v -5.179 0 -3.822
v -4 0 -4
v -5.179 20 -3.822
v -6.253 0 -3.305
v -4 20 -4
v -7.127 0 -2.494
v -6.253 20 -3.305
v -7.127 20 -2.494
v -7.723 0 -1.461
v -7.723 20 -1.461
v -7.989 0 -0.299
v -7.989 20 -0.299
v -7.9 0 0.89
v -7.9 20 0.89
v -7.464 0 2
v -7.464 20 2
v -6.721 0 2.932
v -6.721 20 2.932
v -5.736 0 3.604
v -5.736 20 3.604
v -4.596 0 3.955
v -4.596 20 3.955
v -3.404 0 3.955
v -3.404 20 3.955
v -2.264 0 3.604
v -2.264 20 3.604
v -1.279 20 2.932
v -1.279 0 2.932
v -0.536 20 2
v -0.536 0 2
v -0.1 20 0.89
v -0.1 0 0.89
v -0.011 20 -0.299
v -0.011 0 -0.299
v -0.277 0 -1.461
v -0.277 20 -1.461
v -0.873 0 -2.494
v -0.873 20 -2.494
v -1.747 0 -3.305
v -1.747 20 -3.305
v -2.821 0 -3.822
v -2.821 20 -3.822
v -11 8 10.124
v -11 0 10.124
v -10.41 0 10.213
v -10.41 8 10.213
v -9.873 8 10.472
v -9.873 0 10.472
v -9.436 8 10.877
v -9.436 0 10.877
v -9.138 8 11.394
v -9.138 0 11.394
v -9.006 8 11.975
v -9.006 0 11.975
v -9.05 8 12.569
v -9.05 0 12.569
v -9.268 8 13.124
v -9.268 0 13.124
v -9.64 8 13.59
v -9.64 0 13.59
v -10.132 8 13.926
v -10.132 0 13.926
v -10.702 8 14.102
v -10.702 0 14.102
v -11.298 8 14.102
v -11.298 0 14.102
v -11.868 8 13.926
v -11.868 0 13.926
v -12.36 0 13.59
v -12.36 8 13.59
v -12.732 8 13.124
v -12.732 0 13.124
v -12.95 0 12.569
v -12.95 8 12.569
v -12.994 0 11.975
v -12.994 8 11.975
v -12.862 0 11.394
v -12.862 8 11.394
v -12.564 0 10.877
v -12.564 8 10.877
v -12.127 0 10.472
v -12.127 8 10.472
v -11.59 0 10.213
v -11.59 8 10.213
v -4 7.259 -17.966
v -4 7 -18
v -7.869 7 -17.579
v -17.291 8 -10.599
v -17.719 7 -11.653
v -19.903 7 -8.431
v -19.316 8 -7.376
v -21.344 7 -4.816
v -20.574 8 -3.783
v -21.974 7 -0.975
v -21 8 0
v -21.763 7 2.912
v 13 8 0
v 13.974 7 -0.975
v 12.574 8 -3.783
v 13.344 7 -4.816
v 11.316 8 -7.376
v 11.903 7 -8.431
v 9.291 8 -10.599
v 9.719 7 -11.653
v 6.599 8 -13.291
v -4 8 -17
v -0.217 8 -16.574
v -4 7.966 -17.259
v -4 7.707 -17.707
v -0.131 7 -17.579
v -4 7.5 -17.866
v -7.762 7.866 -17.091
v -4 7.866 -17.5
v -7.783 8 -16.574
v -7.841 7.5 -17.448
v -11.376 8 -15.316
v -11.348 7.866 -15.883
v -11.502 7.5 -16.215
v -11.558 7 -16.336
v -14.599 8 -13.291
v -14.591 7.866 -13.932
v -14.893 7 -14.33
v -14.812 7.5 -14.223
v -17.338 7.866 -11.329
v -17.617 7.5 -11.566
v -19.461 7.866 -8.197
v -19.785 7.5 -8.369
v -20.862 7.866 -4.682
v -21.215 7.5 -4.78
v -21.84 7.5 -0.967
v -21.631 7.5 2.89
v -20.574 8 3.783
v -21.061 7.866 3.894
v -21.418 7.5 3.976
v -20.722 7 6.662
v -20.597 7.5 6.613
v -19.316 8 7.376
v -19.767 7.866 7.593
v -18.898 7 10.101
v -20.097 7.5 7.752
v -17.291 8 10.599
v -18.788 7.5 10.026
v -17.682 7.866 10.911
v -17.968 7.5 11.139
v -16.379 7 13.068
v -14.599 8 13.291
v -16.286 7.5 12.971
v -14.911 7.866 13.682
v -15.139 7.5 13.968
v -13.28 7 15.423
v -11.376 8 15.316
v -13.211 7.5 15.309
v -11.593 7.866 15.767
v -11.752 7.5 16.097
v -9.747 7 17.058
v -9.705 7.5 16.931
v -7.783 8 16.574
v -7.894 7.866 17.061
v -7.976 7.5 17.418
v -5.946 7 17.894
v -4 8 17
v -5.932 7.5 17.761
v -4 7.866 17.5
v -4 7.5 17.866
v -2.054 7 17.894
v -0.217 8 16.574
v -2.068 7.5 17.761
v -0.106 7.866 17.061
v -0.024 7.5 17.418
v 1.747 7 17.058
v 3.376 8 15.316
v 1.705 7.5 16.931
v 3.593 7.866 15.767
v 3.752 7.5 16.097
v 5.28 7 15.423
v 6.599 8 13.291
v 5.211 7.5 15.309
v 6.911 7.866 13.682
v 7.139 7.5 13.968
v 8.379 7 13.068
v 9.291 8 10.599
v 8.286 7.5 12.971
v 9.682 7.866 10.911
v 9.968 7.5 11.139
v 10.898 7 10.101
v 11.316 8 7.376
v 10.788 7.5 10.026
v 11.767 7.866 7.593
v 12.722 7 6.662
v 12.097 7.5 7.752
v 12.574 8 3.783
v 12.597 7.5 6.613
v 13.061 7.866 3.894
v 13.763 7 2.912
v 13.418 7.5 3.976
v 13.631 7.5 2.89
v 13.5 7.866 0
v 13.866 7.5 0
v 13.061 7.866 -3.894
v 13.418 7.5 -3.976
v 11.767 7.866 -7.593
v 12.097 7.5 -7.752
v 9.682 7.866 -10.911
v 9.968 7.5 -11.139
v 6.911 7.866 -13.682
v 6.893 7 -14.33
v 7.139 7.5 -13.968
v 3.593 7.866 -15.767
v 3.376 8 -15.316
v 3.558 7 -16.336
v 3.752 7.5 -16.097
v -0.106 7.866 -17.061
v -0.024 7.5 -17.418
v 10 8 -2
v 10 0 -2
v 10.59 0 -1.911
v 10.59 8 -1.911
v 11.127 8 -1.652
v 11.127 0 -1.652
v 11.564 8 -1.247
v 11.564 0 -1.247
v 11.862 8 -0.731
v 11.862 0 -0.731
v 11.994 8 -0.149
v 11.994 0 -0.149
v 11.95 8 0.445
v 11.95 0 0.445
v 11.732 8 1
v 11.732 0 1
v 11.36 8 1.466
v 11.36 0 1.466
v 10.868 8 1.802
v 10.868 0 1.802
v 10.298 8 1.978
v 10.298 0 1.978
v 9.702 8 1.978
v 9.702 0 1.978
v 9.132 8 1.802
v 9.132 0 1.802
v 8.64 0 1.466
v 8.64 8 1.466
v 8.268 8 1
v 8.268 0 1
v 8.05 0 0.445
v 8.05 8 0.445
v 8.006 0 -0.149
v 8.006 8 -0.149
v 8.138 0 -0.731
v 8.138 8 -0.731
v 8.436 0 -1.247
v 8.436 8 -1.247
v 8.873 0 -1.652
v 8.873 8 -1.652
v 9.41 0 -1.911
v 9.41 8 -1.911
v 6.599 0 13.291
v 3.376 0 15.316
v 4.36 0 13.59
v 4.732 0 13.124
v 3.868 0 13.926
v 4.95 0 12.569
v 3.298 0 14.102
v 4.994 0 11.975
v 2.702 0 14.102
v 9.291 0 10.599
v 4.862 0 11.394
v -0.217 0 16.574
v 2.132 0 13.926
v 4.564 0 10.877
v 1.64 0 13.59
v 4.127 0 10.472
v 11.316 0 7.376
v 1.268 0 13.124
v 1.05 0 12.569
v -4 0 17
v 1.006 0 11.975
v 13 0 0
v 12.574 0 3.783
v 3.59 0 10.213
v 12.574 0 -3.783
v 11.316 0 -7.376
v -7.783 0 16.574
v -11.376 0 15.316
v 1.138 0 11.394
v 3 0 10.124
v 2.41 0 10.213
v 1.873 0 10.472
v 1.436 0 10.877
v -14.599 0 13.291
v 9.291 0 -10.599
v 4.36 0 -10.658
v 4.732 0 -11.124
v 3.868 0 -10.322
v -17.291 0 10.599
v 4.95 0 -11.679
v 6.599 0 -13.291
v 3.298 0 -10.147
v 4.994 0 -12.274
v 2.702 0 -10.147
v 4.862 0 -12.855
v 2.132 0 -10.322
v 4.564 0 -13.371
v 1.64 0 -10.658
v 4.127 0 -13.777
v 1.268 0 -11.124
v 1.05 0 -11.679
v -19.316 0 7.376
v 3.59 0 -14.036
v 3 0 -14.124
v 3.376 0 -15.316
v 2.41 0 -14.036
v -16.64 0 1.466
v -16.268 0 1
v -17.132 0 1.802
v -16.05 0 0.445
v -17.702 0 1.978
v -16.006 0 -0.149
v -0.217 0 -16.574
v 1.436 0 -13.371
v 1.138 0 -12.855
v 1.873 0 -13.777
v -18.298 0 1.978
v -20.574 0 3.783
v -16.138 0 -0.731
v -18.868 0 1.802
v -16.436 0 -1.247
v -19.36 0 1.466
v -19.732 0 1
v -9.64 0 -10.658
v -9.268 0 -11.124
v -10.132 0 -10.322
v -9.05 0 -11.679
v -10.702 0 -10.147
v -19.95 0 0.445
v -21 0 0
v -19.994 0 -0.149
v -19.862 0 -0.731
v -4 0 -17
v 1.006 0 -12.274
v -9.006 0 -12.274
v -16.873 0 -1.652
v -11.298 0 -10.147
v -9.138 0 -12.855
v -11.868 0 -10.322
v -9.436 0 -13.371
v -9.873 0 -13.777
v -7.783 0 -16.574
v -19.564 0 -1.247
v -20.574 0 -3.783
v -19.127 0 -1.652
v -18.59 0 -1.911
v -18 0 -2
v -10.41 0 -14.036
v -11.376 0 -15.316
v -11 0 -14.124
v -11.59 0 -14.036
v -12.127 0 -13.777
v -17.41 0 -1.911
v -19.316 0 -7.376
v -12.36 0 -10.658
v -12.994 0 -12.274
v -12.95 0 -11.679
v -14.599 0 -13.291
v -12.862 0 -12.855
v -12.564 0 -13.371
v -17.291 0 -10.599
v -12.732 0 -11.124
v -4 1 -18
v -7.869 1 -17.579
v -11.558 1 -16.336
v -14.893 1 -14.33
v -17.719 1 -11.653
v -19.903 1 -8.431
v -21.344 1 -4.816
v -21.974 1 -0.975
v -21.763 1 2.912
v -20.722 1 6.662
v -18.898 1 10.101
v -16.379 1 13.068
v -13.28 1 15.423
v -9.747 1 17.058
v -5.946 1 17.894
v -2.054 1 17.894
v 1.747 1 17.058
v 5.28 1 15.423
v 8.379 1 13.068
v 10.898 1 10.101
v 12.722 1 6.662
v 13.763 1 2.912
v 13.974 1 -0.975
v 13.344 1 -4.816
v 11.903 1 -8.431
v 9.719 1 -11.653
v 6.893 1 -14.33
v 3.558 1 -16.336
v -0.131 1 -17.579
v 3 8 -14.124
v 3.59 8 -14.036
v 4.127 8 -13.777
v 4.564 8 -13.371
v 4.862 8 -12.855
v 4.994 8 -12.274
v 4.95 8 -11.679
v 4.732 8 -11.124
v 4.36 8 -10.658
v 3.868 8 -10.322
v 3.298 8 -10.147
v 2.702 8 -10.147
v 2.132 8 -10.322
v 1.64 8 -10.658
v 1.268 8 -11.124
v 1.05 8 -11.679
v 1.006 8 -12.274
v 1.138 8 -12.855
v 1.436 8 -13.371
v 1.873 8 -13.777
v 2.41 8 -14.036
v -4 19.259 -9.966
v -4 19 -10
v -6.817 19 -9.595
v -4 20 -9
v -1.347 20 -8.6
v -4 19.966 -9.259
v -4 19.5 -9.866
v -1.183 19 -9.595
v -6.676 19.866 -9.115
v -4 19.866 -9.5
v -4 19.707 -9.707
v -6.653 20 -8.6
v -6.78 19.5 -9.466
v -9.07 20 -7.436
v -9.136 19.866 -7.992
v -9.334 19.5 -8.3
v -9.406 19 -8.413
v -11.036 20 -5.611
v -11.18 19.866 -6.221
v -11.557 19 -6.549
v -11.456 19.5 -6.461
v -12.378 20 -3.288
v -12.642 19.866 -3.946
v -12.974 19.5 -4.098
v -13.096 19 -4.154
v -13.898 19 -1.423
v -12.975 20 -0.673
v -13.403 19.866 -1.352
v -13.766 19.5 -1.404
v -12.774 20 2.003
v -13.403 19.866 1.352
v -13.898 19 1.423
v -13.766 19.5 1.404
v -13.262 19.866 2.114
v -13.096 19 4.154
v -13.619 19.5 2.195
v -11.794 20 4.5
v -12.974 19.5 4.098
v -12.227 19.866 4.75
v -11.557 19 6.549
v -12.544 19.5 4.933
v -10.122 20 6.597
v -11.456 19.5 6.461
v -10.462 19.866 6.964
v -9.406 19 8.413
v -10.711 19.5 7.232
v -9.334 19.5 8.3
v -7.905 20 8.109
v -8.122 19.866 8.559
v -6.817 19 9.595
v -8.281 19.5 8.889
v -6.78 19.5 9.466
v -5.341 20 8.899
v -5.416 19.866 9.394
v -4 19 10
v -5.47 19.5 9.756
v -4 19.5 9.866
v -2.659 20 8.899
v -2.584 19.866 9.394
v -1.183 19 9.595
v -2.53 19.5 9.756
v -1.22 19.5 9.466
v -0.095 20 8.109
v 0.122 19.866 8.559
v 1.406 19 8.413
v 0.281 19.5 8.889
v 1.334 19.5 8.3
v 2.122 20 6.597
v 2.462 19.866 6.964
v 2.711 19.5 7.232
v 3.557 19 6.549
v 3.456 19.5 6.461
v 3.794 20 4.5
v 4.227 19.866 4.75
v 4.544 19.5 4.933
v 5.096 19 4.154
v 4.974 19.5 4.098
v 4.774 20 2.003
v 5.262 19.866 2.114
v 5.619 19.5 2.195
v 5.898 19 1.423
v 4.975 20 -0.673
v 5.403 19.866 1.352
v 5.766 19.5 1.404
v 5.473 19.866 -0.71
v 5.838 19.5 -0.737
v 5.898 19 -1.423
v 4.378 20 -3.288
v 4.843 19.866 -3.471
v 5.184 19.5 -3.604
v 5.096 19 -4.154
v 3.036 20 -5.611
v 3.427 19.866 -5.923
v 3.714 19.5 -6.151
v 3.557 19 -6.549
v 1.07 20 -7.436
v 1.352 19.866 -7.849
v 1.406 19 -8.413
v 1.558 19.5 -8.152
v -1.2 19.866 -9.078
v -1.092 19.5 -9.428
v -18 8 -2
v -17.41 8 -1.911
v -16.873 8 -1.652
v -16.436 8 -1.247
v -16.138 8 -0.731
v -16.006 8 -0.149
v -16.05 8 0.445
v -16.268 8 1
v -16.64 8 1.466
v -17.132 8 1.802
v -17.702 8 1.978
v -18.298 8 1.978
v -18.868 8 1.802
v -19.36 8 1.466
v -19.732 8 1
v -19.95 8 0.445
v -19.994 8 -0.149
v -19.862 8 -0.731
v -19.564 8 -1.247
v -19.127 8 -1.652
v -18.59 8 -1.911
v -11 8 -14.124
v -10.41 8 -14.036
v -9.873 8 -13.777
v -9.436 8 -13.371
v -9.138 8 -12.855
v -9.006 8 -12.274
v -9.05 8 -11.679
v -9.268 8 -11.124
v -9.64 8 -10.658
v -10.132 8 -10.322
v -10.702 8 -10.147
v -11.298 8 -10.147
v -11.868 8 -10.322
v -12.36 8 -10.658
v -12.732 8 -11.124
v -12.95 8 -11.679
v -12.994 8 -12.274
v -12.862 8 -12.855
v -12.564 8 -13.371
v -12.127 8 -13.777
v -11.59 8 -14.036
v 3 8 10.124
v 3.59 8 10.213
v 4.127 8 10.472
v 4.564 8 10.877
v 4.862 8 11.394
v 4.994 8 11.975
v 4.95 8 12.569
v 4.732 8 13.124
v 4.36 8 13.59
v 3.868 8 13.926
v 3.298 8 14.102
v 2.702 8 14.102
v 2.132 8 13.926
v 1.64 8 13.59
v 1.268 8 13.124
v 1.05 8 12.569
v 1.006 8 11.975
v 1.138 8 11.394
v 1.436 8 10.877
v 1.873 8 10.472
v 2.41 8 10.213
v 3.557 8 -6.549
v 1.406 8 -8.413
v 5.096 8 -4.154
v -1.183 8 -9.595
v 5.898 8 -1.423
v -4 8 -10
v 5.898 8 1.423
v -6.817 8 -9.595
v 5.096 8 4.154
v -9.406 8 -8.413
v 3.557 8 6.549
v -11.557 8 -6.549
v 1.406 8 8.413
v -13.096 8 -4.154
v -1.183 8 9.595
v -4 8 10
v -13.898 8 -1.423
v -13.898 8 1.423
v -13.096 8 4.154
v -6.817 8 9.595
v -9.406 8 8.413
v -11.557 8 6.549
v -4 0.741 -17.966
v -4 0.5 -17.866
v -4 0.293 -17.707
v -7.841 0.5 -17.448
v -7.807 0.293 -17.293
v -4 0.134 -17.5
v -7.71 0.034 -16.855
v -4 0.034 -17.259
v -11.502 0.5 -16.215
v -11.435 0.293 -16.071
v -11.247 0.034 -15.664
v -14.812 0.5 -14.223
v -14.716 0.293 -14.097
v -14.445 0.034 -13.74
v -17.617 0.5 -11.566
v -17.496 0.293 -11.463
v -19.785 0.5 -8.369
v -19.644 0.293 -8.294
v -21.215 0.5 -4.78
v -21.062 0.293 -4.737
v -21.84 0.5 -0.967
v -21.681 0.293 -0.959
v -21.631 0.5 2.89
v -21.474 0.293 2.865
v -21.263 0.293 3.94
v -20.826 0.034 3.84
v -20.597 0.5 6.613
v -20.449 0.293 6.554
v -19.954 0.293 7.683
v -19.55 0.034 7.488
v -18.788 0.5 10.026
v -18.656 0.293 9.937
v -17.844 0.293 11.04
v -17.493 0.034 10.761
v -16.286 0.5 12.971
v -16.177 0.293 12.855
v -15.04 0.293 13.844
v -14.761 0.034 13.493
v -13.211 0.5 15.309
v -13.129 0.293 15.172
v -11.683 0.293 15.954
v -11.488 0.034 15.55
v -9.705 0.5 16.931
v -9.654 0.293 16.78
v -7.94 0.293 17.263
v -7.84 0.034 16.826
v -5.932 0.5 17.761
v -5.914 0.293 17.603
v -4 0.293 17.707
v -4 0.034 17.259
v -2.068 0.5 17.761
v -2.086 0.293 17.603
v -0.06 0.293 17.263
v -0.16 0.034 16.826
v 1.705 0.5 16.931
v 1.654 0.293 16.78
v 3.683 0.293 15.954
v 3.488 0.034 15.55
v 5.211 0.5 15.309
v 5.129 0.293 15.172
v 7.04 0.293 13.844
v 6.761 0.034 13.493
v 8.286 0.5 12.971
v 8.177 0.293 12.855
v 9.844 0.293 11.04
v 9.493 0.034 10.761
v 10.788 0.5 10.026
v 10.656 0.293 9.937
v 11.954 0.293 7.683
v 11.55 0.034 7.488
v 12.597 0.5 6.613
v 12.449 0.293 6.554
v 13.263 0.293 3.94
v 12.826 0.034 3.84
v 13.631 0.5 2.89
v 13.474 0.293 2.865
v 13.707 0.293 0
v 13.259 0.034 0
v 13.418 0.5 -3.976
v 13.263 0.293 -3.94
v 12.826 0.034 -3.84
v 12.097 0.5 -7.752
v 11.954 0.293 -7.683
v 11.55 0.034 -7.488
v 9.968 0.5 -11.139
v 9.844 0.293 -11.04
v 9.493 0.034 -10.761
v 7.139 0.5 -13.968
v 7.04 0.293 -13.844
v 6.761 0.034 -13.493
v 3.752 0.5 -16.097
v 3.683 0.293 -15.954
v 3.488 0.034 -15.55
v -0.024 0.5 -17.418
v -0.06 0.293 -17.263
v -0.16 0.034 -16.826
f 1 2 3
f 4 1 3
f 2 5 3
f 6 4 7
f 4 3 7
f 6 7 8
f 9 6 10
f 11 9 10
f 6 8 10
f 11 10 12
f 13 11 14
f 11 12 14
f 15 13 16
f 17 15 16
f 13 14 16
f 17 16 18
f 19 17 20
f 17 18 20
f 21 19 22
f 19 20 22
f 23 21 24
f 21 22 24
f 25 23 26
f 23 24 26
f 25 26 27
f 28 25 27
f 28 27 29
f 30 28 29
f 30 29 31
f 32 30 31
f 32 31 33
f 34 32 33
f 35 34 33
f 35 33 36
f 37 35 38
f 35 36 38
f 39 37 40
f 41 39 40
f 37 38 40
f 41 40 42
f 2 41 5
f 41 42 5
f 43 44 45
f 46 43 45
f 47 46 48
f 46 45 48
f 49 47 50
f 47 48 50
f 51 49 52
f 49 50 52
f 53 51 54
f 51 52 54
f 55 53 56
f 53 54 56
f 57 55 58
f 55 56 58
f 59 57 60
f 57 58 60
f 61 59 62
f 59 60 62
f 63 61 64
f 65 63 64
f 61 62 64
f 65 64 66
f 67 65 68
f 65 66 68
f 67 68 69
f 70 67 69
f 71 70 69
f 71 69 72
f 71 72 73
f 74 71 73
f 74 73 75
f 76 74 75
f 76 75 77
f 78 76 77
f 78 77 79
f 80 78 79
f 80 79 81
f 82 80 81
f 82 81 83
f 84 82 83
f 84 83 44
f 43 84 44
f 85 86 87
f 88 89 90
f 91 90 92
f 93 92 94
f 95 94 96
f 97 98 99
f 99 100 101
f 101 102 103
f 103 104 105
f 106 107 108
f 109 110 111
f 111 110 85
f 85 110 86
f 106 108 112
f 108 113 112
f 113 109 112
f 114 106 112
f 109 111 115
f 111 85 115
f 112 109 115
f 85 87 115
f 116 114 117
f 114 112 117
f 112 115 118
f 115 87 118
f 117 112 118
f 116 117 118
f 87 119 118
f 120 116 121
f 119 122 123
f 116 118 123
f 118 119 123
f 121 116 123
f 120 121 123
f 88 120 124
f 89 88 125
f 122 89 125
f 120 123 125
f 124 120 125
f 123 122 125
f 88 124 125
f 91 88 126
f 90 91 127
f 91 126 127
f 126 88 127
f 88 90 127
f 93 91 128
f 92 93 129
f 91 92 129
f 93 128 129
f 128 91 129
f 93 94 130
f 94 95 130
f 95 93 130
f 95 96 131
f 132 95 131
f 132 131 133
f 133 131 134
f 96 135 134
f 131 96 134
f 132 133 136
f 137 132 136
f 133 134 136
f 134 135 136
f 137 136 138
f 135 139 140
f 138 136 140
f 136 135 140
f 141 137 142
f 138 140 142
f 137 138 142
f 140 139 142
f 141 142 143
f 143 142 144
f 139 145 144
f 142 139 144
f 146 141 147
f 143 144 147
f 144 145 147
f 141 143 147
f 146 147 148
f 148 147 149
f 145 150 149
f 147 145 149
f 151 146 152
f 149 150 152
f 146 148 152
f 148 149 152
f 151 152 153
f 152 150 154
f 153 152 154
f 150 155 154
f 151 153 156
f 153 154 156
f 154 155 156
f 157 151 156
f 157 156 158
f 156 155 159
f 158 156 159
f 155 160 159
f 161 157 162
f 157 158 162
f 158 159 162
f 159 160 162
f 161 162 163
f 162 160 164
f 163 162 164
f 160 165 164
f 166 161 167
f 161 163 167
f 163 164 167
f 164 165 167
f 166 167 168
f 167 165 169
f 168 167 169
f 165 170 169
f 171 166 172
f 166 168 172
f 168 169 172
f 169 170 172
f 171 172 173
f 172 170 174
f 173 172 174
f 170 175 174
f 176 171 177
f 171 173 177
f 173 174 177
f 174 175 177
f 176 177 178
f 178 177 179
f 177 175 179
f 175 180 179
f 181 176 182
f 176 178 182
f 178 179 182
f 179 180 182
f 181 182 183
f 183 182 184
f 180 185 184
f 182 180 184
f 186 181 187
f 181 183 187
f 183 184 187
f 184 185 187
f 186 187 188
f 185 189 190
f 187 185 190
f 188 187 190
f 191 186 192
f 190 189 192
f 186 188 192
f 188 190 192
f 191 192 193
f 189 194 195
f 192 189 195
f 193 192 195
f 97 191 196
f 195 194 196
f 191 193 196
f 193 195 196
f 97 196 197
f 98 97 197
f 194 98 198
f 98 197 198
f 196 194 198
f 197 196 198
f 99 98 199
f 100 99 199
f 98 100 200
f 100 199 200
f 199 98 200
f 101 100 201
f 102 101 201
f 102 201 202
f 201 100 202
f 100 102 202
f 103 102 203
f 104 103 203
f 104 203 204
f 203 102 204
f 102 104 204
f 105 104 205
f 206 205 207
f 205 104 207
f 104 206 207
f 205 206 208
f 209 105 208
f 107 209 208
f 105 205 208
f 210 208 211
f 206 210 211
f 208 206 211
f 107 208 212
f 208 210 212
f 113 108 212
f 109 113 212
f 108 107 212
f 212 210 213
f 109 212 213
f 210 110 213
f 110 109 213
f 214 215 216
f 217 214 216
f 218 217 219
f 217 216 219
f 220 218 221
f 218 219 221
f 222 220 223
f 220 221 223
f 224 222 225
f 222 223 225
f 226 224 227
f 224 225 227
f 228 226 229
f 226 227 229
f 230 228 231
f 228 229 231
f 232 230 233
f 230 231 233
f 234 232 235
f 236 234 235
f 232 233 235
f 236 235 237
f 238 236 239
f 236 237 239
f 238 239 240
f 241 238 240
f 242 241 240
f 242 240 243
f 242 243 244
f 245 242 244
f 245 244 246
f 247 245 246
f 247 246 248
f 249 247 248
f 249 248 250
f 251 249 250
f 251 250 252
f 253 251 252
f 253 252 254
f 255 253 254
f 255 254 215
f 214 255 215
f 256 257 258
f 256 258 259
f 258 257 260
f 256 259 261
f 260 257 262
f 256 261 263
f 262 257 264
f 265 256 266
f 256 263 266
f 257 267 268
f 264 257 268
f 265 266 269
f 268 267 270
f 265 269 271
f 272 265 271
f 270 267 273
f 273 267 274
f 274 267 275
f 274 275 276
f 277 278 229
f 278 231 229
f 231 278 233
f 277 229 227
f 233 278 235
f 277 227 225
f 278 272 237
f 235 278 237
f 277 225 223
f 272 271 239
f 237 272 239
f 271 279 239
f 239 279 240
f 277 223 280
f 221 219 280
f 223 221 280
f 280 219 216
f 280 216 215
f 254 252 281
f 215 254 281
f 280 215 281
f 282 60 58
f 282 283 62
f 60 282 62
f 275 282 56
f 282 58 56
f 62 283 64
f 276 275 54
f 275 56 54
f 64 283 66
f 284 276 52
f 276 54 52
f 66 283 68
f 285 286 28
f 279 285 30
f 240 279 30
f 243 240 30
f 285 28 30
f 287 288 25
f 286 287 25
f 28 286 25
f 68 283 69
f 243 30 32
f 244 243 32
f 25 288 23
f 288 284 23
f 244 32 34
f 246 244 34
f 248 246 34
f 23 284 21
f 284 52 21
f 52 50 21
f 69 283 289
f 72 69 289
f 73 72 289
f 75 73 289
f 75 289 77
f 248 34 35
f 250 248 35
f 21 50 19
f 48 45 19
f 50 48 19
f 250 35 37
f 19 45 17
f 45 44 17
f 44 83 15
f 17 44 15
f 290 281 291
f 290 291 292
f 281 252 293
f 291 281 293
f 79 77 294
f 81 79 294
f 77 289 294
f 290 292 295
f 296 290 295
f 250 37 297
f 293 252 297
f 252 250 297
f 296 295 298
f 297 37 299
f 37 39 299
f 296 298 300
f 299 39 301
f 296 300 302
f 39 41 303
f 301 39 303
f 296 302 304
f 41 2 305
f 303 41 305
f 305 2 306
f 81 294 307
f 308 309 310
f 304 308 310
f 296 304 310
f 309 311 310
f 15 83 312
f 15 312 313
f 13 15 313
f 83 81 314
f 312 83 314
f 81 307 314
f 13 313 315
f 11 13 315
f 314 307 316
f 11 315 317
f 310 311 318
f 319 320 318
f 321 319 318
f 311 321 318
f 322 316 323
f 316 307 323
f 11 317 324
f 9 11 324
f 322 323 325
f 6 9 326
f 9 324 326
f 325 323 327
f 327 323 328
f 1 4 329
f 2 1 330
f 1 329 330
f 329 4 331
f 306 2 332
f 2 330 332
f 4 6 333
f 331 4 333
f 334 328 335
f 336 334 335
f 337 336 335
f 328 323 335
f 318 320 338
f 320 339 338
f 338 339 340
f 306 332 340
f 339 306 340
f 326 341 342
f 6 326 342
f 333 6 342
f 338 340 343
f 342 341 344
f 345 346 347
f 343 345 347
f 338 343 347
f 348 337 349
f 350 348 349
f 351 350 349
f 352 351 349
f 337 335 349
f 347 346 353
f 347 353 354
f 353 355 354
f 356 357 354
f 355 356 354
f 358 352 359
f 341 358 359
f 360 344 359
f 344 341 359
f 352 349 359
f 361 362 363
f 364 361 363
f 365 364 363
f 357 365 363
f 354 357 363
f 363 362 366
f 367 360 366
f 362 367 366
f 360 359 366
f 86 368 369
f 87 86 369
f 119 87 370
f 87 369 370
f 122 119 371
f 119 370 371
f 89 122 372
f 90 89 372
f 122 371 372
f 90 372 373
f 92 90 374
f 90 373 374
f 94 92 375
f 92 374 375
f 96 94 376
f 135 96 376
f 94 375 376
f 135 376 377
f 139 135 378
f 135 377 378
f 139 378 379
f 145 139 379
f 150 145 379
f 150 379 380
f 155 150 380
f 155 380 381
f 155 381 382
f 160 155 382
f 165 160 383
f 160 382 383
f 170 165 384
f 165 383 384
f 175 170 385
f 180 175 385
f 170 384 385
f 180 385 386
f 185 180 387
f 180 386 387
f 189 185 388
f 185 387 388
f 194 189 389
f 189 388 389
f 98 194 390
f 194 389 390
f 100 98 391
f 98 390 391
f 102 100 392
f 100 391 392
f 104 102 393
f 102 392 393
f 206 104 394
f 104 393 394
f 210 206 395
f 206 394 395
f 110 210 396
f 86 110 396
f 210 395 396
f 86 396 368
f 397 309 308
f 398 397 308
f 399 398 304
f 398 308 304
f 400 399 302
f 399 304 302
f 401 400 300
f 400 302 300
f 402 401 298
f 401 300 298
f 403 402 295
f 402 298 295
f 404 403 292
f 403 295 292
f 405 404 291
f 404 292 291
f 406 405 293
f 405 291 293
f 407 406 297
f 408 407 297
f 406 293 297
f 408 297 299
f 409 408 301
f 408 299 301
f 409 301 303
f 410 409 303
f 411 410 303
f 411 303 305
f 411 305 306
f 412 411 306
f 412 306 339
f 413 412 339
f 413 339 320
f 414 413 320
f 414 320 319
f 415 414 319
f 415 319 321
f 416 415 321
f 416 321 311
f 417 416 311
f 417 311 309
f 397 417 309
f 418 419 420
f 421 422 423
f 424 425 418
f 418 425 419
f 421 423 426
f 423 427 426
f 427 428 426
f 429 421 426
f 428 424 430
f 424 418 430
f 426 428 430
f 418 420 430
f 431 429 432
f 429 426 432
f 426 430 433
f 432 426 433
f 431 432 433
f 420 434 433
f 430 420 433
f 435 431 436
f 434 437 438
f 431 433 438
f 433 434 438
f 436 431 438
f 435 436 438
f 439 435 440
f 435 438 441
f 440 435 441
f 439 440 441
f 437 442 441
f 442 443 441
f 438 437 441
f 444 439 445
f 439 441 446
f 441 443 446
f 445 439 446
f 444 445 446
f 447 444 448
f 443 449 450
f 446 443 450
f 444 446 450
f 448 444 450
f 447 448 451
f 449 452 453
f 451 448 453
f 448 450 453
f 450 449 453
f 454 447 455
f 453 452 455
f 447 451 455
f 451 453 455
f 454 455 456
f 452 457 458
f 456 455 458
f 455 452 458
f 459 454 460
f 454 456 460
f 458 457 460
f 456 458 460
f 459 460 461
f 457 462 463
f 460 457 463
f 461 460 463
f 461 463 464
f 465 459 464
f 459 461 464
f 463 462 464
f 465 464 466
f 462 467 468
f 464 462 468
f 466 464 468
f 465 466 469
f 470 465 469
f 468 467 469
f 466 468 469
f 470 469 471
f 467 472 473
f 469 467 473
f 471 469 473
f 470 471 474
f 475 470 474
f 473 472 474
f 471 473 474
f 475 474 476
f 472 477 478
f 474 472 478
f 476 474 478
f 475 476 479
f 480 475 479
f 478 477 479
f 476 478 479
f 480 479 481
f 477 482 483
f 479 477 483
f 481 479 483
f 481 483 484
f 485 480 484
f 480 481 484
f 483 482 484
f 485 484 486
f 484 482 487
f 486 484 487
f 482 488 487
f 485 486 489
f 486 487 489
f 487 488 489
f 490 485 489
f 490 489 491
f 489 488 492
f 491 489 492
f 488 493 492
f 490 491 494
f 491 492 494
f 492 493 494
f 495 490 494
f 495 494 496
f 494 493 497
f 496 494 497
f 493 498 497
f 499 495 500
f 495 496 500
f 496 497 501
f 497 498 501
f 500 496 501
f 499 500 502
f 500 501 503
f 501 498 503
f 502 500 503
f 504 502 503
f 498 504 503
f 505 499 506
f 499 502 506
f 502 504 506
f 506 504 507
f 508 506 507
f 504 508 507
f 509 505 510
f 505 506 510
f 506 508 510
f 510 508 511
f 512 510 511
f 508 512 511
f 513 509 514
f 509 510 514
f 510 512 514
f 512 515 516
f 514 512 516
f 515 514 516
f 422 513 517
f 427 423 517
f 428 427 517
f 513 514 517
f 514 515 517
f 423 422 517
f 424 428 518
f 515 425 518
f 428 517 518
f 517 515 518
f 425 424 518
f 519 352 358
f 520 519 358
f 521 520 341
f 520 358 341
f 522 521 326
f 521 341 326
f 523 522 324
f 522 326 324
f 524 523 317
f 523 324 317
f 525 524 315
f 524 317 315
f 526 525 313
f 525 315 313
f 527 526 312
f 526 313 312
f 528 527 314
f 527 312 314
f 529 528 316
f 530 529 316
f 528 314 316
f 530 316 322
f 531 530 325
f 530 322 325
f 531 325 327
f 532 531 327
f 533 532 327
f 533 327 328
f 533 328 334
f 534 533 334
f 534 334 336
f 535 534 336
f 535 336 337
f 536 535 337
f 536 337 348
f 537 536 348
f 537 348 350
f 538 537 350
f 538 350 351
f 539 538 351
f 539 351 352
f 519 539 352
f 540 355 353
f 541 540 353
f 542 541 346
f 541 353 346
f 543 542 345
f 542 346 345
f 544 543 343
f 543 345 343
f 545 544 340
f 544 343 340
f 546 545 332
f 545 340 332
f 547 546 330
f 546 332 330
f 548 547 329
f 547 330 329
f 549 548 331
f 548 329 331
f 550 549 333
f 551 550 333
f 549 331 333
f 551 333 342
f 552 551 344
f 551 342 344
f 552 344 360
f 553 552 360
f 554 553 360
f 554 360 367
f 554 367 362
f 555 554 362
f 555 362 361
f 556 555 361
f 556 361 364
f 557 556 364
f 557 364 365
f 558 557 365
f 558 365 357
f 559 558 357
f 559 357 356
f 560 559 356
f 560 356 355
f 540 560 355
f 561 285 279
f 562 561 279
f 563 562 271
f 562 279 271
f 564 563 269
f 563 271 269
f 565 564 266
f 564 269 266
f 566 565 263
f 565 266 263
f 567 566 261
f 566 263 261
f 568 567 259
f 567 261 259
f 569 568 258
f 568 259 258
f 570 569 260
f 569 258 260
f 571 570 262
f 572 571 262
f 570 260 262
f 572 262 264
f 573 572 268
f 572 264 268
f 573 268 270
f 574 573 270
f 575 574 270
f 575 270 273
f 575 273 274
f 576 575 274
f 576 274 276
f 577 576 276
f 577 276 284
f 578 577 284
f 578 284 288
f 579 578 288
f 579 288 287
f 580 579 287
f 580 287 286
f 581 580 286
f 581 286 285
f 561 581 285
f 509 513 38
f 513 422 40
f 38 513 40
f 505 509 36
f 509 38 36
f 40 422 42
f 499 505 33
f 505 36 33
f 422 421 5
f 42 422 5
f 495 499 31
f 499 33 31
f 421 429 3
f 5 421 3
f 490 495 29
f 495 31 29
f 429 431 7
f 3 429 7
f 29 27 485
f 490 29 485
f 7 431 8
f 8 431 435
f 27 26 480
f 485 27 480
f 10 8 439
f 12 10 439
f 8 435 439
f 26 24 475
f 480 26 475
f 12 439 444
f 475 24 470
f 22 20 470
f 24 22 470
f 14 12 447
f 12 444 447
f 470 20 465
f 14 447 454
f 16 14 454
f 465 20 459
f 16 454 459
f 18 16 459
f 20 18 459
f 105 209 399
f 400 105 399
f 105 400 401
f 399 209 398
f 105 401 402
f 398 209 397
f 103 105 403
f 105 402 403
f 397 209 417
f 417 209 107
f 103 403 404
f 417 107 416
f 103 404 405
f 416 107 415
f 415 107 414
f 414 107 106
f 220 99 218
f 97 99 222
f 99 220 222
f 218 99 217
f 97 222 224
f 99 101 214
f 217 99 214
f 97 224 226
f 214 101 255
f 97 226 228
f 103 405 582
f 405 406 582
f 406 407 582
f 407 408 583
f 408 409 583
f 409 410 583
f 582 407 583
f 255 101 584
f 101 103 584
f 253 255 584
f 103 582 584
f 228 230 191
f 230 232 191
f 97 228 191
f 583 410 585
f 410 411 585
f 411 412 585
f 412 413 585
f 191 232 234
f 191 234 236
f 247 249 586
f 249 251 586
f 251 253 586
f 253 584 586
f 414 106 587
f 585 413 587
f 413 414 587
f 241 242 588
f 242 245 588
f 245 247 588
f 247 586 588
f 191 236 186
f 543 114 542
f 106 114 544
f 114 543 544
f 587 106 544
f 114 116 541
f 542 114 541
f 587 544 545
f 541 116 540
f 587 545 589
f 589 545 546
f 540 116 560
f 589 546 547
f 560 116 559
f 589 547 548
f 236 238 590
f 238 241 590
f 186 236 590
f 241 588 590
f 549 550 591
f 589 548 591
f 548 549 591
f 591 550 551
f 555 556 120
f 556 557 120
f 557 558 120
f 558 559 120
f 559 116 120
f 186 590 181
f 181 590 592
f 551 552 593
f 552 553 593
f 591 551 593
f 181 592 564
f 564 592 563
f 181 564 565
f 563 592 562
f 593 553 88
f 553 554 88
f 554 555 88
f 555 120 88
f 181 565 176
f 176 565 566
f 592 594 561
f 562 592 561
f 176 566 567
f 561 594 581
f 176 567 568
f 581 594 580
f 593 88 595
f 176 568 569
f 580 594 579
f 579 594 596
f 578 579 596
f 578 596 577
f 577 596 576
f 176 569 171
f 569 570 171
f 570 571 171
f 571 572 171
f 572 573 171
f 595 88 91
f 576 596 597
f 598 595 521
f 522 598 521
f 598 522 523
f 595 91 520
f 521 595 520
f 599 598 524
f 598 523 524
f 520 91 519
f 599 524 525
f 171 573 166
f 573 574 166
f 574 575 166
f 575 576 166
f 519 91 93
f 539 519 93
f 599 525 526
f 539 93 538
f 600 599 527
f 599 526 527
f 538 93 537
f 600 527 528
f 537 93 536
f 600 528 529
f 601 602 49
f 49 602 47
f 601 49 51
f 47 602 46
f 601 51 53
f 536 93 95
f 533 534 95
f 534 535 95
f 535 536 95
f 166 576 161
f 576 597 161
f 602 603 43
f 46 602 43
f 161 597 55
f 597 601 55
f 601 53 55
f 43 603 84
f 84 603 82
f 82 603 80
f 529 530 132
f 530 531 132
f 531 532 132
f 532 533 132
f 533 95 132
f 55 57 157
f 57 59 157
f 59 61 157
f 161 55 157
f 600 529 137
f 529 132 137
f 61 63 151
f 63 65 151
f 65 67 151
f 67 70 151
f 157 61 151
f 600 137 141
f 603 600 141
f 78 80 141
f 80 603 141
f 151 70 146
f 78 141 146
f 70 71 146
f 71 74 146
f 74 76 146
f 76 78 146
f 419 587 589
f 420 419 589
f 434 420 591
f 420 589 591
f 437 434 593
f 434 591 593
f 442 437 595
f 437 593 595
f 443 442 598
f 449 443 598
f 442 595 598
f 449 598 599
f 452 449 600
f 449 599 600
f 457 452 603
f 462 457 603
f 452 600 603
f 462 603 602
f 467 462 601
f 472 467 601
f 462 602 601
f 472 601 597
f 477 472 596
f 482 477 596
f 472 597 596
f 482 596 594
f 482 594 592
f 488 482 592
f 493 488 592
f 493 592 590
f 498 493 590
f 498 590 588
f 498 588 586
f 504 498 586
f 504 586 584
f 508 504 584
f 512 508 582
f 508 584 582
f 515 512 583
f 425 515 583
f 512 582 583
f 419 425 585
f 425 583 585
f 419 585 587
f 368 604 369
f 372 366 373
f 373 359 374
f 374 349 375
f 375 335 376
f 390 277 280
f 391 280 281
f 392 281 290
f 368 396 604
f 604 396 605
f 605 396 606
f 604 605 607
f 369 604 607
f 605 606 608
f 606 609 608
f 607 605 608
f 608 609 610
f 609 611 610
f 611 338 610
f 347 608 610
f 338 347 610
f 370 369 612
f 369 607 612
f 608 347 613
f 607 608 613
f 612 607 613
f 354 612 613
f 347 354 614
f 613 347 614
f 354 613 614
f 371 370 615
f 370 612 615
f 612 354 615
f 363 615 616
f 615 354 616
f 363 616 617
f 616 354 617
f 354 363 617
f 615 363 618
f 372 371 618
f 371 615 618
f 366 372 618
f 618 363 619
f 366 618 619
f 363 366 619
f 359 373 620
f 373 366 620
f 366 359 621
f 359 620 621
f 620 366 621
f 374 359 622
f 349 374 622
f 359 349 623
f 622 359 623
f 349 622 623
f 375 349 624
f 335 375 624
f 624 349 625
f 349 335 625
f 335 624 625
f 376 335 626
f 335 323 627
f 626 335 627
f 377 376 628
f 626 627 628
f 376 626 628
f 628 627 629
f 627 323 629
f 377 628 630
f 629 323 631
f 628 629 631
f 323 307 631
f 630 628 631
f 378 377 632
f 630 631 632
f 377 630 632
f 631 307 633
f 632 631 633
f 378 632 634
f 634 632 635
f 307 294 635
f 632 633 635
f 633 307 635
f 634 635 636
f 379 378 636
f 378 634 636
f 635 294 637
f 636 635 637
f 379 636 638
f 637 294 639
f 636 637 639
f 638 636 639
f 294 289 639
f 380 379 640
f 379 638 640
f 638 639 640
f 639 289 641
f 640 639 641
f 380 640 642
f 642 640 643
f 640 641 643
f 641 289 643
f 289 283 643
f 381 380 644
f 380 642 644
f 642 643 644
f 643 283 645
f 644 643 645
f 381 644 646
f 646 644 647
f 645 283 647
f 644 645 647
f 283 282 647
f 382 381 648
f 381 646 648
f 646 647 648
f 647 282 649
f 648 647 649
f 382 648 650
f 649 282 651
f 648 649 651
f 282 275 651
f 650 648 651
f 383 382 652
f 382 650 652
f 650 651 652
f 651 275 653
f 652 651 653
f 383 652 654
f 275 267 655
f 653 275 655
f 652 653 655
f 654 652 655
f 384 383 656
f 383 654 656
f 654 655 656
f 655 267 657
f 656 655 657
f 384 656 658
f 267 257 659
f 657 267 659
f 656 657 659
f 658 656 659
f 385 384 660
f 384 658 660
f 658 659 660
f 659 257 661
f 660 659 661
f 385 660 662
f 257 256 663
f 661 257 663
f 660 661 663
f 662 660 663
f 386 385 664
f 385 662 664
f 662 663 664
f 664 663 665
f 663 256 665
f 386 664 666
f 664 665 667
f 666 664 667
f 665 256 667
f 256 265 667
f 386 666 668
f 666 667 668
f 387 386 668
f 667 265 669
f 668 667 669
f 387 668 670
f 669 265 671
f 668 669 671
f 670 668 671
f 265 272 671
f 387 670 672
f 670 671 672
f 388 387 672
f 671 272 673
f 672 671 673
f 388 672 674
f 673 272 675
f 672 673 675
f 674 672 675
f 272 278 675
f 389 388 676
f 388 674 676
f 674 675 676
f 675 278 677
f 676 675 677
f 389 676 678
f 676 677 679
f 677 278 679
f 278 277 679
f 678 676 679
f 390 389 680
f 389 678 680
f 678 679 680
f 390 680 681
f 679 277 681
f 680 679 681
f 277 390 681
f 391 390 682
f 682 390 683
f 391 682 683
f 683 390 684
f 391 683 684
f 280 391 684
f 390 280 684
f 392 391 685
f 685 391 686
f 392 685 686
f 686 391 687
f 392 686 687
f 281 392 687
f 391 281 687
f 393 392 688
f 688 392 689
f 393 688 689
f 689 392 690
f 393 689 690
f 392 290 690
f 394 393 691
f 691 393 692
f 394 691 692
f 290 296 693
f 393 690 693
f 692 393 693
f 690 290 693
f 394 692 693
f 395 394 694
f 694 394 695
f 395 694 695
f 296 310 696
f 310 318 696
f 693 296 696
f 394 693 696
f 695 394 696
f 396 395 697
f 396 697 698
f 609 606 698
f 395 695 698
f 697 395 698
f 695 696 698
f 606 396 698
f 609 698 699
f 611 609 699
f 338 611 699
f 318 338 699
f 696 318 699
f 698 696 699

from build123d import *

# Parameters (mm, degrees)
FILLET1_R          = 1
SKETCH2_R          = 2
CUT_EXTRUDE1_DEPTH = 10


with BuildPart() as part:
    # Sketch1 → Revolve1 (revolve)
    with BuildSketch(Plane.XY, mode=Mode.PRIVATE) as revolve1_sk:
        Polygon((0, 0), (0, 20), (6, 20), (6, 8), (14, 8), (14, 0), align=None)
    revolve(revolve1_sk.sketch.rotate(Axis((-4, 0, 0), (0, 1, 0)), 90), axis=Axis((-4, 0, 0), (0, 1, 0)))

    # Fillet1
    fillet1_edges = [part.edges().sort_by_distance(p)[0] for p in [
        (-4, 0, 18),
        (-4, 8, 18),
        (-4, 20, 10),
    ]]
    fillet(fillet1_edges, radius=FILLET1_R)

    # Sketch2 → Cut-Extrude1 (cut)
    with BuildSketch(Plane(origin=(0, 0, 0), x_dir=(-1, 0, 0), z_dir=(0, -1, 0))):
        with Locations(Location((18, 0, 0), (0, 0, 90))):
            Circle(SKETCH2_R)
        with Locations(Location((11, -12.124355653, 0), (0, 0, 90))):
            Circle(SKETCH2_R)
        with Locations(Location((-3, -12.124355653, 0), (0, 0, 90))):
            Circle(SKETCH2_R)
        with Locations(Location((-10, 0, 0), (0, 0, 90))):
            Circle(SKETCH2_R)
        with Locations(Location((-3, 12.124355653, 0), (0, 0, 90))):
            Circle(SKETCH2_R)
        with Locations(Location((11, 12.124355653, 0), (0, 0, 90))):
            Circle(SKETCH2_R)
    extrude(amount=-CUT_EXTRUDE1_DEPTH, mode=Mode.SUBTRACT)


solid = part.part
